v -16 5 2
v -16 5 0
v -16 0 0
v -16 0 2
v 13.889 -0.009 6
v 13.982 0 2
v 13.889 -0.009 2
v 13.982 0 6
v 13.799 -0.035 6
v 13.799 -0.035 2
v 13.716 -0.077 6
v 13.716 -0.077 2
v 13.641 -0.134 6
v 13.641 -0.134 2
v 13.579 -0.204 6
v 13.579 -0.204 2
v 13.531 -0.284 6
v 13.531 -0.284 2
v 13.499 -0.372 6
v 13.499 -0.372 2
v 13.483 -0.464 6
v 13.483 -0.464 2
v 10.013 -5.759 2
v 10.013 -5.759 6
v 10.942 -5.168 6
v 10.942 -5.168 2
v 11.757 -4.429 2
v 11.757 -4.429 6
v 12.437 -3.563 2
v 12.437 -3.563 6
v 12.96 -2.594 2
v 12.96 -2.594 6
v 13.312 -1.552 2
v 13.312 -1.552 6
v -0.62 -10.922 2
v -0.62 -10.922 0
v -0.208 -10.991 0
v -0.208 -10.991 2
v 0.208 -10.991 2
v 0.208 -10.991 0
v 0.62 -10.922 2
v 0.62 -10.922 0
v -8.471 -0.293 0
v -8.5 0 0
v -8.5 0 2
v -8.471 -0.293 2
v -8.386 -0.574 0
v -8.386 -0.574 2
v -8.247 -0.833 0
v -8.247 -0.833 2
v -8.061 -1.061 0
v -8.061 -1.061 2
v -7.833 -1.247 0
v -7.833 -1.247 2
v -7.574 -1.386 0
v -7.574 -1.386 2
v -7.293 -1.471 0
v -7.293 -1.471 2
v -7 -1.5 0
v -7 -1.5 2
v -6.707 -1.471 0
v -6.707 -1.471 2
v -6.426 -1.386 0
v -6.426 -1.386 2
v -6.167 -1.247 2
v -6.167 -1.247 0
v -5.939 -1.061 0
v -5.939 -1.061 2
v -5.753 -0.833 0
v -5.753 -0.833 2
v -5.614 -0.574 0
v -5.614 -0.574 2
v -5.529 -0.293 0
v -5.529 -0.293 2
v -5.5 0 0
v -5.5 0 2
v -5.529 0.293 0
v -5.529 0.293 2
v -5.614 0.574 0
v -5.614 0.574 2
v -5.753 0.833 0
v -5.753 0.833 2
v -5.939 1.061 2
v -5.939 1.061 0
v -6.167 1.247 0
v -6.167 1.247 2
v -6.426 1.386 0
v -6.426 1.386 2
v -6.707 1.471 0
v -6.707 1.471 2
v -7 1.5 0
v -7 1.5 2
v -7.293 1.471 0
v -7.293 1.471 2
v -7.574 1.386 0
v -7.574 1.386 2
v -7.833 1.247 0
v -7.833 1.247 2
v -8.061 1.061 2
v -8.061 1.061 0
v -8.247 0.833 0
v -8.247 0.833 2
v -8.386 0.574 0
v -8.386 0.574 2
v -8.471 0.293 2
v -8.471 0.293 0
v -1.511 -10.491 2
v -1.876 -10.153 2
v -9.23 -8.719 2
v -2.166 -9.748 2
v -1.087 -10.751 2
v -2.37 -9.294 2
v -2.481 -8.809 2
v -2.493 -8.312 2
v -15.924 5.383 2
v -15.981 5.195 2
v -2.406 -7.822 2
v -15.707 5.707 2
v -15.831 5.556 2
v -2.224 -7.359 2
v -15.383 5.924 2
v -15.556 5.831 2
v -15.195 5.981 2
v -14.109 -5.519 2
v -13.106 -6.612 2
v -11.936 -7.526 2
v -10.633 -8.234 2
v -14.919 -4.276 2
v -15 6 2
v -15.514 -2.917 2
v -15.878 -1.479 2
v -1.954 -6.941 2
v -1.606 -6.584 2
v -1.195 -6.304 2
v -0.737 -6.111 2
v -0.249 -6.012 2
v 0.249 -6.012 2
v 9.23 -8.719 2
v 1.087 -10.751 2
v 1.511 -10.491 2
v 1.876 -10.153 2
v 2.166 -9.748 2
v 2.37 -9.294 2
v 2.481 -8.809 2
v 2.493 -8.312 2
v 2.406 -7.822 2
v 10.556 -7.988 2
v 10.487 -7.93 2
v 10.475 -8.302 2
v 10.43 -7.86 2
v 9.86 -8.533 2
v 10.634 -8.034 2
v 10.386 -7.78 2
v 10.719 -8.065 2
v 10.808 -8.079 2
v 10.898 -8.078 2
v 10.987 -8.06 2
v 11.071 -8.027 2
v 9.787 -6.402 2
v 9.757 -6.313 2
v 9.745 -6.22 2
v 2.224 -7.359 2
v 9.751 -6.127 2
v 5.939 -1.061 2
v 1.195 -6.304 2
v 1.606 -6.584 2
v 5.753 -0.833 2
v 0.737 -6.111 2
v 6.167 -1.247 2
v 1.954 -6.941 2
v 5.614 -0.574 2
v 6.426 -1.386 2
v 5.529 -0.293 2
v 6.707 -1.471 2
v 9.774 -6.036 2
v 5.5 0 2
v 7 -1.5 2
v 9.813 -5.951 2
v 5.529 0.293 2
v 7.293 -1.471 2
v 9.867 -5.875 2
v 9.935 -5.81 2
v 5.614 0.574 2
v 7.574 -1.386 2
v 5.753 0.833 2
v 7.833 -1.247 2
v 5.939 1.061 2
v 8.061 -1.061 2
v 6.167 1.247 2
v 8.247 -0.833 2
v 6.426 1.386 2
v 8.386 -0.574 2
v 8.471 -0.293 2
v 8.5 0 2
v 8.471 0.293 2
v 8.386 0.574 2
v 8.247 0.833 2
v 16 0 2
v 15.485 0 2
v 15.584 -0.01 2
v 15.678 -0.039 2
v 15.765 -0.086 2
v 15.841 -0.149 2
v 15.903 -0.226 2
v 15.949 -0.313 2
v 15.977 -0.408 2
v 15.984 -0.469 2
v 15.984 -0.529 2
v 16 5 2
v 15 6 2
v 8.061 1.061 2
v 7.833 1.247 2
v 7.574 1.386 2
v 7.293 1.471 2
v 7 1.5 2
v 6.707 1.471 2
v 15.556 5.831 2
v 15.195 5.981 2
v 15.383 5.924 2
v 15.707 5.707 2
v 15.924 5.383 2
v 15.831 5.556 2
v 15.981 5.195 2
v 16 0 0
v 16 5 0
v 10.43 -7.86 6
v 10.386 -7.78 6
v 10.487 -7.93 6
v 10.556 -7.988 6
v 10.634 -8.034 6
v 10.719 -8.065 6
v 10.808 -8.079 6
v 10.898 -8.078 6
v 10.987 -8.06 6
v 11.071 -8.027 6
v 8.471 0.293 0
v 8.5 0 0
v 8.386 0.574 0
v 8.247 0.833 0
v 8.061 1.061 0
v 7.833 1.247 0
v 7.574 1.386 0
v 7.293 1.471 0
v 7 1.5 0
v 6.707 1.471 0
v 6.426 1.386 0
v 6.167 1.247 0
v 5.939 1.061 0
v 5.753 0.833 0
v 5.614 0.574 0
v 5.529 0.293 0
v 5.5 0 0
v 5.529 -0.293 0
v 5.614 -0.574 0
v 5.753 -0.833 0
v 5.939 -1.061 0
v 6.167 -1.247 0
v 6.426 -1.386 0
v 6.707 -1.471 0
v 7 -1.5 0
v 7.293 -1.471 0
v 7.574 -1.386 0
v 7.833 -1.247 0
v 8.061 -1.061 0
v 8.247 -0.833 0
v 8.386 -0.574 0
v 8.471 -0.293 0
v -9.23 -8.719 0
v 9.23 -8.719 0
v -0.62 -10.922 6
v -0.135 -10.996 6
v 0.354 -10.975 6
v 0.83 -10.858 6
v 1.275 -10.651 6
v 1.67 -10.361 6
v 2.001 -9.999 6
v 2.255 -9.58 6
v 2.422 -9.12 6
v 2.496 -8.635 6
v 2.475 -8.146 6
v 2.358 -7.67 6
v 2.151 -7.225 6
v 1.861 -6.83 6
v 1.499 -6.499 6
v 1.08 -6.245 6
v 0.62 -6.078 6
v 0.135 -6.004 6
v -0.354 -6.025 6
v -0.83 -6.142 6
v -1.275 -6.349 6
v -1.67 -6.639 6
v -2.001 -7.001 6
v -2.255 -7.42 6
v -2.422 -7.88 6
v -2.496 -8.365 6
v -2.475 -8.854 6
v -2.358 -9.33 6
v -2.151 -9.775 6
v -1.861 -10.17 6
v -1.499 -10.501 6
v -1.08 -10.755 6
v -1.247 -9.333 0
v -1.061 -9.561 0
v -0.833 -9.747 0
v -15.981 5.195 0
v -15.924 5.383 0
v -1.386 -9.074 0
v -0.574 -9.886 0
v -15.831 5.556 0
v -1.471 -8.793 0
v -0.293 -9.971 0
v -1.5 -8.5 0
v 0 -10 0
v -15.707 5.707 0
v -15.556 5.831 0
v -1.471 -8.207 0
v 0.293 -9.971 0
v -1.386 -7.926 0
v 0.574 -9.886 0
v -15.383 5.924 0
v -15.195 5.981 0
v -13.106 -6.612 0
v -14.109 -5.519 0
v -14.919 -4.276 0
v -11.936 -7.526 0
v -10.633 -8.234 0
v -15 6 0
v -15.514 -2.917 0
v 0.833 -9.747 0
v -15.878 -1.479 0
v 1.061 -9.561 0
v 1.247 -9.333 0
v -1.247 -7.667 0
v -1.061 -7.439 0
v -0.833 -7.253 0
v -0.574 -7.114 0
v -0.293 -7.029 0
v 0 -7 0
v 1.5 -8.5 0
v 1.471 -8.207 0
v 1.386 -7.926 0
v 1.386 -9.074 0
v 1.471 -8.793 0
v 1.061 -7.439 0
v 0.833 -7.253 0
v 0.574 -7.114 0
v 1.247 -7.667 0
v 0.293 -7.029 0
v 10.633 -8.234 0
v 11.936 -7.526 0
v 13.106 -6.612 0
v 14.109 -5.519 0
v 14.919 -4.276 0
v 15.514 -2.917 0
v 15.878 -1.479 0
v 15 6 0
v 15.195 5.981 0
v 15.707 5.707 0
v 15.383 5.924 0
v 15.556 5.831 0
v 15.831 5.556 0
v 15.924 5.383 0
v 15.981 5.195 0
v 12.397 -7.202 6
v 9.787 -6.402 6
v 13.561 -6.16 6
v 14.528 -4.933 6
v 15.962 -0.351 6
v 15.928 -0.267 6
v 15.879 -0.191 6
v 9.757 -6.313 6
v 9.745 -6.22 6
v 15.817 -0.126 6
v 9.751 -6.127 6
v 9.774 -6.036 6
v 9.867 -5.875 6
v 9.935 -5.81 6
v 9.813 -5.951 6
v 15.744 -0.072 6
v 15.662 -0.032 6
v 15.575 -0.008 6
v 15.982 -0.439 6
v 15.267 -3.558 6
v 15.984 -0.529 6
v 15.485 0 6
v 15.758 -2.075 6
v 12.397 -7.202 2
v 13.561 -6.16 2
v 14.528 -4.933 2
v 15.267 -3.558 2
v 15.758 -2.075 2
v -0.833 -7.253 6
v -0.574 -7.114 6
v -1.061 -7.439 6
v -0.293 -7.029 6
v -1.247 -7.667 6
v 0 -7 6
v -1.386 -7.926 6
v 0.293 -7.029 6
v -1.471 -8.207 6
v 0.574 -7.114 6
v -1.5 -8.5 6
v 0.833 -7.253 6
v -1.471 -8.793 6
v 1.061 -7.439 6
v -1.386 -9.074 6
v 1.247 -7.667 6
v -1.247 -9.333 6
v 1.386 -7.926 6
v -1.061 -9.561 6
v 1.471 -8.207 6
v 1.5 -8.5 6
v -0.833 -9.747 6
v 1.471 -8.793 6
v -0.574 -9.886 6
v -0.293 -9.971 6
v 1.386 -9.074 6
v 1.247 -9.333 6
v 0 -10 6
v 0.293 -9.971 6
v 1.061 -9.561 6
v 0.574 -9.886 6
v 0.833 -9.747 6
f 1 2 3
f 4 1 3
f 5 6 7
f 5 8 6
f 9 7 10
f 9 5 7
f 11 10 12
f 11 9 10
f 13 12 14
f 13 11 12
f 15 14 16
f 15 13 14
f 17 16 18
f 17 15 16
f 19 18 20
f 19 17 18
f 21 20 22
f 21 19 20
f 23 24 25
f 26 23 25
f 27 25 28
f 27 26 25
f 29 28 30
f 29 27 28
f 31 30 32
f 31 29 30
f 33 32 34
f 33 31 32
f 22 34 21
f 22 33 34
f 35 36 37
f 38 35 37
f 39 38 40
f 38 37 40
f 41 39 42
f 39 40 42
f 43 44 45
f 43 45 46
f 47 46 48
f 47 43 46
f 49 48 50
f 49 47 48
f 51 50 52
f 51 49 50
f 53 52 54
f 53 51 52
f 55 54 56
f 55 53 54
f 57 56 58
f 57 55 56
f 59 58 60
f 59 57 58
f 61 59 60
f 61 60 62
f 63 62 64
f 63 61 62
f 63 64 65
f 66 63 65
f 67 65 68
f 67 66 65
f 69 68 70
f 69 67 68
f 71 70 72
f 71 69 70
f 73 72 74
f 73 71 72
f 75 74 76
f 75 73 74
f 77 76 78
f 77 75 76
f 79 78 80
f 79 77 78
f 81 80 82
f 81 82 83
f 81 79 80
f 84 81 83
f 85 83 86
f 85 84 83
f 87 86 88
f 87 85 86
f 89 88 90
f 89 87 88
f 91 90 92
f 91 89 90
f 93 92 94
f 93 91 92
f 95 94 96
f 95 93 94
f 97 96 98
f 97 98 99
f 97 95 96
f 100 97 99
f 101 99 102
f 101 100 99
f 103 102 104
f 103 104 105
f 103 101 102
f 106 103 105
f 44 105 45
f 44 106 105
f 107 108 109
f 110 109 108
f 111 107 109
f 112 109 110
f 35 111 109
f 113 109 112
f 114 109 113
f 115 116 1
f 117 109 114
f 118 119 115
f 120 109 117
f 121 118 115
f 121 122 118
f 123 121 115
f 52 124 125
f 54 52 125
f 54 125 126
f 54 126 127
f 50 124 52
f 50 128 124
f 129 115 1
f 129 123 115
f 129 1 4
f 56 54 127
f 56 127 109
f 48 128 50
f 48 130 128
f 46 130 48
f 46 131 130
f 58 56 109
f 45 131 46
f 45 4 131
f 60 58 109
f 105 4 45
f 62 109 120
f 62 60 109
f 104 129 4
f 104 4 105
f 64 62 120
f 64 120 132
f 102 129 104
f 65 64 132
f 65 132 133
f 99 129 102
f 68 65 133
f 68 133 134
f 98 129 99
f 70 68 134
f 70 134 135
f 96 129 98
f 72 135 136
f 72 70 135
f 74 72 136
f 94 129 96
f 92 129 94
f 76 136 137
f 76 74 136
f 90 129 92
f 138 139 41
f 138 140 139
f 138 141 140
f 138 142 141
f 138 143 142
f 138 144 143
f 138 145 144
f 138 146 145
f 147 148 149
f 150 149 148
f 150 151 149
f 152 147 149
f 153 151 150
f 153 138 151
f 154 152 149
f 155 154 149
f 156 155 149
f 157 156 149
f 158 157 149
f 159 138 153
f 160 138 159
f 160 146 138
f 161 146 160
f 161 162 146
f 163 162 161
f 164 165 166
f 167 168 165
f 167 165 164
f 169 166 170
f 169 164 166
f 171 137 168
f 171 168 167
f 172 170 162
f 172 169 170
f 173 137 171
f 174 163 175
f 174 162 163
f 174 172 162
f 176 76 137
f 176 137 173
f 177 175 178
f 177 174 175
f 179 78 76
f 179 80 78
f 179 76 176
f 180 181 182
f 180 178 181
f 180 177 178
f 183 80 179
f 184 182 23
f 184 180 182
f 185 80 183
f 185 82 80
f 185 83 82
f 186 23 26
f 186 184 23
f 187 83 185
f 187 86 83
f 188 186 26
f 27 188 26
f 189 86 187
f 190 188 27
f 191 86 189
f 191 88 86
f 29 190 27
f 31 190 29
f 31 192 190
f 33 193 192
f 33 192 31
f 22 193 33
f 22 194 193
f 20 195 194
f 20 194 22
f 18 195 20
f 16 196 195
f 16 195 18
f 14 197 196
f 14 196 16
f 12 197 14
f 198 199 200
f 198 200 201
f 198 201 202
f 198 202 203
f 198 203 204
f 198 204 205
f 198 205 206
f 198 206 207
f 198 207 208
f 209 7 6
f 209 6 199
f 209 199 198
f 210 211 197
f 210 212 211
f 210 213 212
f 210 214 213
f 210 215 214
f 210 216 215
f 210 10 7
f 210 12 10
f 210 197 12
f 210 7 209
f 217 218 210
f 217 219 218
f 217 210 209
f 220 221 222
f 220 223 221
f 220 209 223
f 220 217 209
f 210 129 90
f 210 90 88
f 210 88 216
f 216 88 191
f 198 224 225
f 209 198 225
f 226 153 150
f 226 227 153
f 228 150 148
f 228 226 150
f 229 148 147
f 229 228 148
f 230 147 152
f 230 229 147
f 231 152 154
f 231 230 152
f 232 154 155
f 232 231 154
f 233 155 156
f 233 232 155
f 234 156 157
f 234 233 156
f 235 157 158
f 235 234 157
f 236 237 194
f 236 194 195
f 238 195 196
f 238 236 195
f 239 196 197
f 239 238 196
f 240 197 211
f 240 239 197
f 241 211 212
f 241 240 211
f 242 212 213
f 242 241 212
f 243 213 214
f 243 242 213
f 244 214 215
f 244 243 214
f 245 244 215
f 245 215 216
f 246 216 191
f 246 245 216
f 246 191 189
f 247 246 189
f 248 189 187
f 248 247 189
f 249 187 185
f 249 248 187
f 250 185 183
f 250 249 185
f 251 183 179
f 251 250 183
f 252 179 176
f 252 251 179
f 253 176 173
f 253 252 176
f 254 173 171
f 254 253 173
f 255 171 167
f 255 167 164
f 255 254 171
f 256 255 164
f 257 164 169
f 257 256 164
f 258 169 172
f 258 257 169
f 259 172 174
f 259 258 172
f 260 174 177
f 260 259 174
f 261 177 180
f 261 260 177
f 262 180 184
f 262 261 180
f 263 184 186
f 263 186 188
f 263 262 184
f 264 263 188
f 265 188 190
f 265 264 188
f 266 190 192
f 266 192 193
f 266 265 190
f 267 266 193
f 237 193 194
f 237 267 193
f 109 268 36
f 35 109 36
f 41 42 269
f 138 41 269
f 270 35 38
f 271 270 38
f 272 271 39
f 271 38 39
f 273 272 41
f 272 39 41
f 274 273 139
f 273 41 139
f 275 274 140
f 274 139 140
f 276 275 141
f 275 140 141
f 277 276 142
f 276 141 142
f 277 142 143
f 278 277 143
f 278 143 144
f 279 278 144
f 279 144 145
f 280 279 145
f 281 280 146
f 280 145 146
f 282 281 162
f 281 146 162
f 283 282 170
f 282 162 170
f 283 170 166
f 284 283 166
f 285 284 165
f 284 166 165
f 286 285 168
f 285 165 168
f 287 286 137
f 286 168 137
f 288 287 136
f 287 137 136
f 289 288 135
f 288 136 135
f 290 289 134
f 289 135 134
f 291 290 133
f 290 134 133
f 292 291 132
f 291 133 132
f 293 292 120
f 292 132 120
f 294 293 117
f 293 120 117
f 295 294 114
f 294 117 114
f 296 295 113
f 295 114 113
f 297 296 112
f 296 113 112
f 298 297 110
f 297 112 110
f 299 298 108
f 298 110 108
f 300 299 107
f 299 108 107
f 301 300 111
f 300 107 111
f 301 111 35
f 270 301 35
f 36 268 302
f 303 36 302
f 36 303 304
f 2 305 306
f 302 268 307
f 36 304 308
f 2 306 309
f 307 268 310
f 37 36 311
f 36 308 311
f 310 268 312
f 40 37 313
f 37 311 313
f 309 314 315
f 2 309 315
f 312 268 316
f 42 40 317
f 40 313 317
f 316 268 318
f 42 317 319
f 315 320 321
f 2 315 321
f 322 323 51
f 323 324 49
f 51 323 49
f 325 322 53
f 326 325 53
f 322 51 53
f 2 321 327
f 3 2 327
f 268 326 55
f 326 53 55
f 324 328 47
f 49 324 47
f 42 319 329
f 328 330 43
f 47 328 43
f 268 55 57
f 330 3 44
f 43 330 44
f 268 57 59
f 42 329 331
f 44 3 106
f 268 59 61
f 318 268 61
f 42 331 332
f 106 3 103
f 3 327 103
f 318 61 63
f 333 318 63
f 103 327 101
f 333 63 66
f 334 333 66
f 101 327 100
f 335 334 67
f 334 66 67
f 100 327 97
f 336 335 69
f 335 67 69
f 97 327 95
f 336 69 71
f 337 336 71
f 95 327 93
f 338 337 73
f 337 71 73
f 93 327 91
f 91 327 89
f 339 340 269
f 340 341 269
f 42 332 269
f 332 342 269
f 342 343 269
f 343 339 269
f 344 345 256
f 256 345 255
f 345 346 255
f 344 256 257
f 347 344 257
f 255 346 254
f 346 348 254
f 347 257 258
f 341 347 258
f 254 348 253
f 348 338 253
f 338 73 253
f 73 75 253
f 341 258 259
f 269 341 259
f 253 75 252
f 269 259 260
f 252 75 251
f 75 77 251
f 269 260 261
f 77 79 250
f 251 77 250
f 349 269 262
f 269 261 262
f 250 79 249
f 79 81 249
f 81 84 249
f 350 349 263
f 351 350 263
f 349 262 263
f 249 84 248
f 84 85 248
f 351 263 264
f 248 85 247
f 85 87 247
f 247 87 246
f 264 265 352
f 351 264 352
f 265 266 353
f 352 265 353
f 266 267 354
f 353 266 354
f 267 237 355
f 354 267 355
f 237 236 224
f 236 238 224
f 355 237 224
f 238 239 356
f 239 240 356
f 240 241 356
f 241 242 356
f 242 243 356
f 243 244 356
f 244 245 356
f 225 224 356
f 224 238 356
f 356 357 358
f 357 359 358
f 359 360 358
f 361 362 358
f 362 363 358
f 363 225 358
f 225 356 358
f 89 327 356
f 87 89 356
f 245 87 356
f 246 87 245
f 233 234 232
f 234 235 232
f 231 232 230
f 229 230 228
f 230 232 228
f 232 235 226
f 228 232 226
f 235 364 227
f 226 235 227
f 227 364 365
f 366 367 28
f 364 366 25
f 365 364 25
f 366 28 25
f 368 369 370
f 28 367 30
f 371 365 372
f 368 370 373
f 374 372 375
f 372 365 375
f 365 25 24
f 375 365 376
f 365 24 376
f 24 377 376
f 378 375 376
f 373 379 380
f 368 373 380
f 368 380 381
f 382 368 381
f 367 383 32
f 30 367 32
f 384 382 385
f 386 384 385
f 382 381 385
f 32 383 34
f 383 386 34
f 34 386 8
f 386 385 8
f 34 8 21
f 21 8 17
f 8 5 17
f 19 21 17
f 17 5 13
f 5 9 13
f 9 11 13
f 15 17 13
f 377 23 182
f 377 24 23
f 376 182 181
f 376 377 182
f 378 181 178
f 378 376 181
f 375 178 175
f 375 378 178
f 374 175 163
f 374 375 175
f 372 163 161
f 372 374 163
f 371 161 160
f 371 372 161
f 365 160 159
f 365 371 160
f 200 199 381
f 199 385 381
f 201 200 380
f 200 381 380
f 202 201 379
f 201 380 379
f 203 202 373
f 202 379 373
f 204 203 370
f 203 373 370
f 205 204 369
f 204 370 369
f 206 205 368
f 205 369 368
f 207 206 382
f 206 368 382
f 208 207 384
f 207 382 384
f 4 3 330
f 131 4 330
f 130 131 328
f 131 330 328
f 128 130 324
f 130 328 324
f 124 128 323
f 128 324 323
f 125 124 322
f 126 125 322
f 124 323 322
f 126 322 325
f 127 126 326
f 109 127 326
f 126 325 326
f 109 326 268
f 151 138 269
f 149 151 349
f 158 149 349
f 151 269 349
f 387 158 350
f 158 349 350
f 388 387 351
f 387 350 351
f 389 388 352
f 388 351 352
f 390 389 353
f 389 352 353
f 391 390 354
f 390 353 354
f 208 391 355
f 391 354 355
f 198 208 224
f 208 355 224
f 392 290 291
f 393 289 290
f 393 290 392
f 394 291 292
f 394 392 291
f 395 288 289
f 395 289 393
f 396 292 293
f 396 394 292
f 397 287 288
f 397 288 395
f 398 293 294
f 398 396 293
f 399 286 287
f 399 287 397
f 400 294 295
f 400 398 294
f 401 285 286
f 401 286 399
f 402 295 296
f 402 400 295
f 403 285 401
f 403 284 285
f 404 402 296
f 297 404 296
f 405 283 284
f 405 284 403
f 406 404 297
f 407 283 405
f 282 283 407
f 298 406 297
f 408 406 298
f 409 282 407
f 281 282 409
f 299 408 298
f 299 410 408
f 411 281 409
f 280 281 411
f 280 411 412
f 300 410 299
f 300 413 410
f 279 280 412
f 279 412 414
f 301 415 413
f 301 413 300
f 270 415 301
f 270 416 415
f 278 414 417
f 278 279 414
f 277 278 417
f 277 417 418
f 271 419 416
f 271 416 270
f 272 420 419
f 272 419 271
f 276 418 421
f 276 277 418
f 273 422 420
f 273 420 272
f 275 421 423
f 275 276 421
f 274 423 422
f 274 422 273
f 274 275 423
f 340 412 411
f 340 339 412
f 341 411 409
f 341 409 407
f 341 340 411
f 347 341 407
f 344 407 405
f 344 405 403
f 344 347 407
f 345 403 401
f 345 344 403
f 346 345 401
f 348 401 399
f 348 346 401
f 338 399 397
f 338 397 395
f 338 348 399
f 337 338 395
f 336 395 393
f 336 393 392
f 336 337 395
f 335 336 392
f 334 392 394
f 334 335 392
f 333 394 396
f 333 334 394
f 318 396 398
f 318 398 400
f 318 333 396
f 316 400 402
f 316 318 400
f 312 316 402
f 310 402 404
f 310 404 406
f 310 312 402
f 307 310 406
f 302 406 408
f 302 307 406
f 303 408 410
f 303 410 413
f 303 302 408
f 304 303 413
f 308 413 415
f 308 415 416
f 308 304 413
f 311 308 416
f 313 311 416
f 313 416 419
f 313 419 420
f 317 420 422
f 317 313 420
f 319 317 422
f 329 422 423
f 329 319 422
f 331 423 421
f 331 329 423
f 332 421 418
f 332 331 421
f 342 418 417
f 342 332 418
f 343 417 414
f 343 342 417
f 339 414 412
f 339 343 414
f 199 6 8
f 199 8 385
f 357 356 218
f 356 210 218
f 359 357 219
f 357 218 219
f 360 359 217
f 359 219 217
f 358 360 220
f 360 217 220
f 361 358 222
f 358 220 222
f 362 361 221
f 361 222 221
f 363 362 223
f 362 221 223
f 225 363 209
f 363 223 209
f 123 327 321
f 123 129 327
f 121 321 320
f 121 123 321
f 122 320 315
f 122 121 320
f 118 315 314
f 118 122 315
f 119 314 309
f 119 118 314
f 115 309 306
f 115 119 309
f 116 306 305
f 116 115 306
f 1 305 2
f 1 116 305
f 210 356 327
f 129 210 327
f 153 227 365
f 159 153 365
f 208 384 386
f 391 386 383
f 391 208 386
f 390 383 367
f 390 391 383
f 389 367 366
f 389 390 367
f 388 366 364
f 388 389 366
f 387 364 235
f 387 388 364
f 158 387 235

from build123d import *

# Parameters (mm, degrees)
SKETCH_2_R      = 1.5
EXTRUDE_1_DEPTH = 2
EXTRUDE_2_DEPTH = 4
FILLET_1_R      = 1
FILLET_4_R      = 0.5
SKETCH_4_R      = 2.5
SKETCH_4_R_2    = 1.5
EXTRUDE_3_DEPTH = 4


with BuildPart() as part:
    # 草图2 → 凸台-拉伸1 (new body)
    with BuildSketch(Plane.XY):
        with BuildLine():
            Line((7, 6), (-7, 6))
            Line((-7, 6), (-16, 6))
            Line((-16, 6), (-16, 0))
            ThreePointArc((-16, 0), (-14.108952351, -5.519311231), (-9.230489674, -8.71922679))
            Line((-9.230489674, -8.71922679), (-0.619580465, -10.922007442))
            ThreePointArc((-0.619580465, -10.922007442), (0, -11), (0.619580465, -10.922007442))
            Line((0.619580465, -10.922007442), (9.230489674, -8.71922679))
            ThreePointArc((9.230489674, -8.71922679), (14.108952351, -5.519311231), (16, 0))
            Line((16, 0), (16, 6))
            Line((16, 6), (7, 6))
        make_face()
        with Locations((0, -8.5)):
            Circle(SKETCH_2_R, mode=Mode.SUBTRACT)
        with Locations((7, 0)):
            Circle(SKETCH_2_R, mode=Mode.SUBTRACT)
        with Locations(Location((-7, 0, 0), (0, 0, 180))):
            Circle(SKETCH_2_R, mode=Mode.SUBTRACT)
    extrude(amount=EXTRUDE_1_DEPTH)

    # 草图3 → 凸台-拉伸2 (add)
    with BuildSketch(Plane.XY.offset(2)):
        with BuildLine():
            Line((13.5, 0), (16, 0))
            ThreePointArc((16, 0), (14.527522767, -4.933193793), (10.591910889, -8.252161909))
            Line((10.591910889, -8.252161909), (9.594157864, -5.959894712))
            ThreePointArc((9.594157864, -5.959894712), (12.43654422, -3.562862184), (13.5, 0))
        make_face()
    extrude(amount=EXTRUDE_2_DEPTH)

    # 圆角1
    fillet_1_edges = [part.edges().sort_by_distance(p)[0] for p in [
        (-16, 6, 1),
        (16, 6, 1),
    ]]
    fillet(fillet_1_edges, radius=FILLET_1_R)

    # 圆角4
    fillet_4_edges = [part.edges().sort_by_distance(p)[0] for p in [
        (10.591910889, -8.252161909, 4),
        (16, 0, 4),
        (13.5, 0, 4),
        (9.594157864, -5.959894712, 4),
    ]]
    fillet(fillet_4_edges, radius=FILLET_4_R)

    # 草图4 → 凸台-拉伸3 (add)
    with BuildSketch(Plane.XY.offset(2)):
        with Locations(Location((0, -8.5, 0), (0, 0, 255.650730884))):
            Circle(SKETCH_4_R)
        with Locations((0, -8.5)):
            Circle(SKETCH_4_R_2, mode=Mode.SUBTRACT)
    extrude(amount=EXTRUDE_3_DEPTH)


solid = part.part
